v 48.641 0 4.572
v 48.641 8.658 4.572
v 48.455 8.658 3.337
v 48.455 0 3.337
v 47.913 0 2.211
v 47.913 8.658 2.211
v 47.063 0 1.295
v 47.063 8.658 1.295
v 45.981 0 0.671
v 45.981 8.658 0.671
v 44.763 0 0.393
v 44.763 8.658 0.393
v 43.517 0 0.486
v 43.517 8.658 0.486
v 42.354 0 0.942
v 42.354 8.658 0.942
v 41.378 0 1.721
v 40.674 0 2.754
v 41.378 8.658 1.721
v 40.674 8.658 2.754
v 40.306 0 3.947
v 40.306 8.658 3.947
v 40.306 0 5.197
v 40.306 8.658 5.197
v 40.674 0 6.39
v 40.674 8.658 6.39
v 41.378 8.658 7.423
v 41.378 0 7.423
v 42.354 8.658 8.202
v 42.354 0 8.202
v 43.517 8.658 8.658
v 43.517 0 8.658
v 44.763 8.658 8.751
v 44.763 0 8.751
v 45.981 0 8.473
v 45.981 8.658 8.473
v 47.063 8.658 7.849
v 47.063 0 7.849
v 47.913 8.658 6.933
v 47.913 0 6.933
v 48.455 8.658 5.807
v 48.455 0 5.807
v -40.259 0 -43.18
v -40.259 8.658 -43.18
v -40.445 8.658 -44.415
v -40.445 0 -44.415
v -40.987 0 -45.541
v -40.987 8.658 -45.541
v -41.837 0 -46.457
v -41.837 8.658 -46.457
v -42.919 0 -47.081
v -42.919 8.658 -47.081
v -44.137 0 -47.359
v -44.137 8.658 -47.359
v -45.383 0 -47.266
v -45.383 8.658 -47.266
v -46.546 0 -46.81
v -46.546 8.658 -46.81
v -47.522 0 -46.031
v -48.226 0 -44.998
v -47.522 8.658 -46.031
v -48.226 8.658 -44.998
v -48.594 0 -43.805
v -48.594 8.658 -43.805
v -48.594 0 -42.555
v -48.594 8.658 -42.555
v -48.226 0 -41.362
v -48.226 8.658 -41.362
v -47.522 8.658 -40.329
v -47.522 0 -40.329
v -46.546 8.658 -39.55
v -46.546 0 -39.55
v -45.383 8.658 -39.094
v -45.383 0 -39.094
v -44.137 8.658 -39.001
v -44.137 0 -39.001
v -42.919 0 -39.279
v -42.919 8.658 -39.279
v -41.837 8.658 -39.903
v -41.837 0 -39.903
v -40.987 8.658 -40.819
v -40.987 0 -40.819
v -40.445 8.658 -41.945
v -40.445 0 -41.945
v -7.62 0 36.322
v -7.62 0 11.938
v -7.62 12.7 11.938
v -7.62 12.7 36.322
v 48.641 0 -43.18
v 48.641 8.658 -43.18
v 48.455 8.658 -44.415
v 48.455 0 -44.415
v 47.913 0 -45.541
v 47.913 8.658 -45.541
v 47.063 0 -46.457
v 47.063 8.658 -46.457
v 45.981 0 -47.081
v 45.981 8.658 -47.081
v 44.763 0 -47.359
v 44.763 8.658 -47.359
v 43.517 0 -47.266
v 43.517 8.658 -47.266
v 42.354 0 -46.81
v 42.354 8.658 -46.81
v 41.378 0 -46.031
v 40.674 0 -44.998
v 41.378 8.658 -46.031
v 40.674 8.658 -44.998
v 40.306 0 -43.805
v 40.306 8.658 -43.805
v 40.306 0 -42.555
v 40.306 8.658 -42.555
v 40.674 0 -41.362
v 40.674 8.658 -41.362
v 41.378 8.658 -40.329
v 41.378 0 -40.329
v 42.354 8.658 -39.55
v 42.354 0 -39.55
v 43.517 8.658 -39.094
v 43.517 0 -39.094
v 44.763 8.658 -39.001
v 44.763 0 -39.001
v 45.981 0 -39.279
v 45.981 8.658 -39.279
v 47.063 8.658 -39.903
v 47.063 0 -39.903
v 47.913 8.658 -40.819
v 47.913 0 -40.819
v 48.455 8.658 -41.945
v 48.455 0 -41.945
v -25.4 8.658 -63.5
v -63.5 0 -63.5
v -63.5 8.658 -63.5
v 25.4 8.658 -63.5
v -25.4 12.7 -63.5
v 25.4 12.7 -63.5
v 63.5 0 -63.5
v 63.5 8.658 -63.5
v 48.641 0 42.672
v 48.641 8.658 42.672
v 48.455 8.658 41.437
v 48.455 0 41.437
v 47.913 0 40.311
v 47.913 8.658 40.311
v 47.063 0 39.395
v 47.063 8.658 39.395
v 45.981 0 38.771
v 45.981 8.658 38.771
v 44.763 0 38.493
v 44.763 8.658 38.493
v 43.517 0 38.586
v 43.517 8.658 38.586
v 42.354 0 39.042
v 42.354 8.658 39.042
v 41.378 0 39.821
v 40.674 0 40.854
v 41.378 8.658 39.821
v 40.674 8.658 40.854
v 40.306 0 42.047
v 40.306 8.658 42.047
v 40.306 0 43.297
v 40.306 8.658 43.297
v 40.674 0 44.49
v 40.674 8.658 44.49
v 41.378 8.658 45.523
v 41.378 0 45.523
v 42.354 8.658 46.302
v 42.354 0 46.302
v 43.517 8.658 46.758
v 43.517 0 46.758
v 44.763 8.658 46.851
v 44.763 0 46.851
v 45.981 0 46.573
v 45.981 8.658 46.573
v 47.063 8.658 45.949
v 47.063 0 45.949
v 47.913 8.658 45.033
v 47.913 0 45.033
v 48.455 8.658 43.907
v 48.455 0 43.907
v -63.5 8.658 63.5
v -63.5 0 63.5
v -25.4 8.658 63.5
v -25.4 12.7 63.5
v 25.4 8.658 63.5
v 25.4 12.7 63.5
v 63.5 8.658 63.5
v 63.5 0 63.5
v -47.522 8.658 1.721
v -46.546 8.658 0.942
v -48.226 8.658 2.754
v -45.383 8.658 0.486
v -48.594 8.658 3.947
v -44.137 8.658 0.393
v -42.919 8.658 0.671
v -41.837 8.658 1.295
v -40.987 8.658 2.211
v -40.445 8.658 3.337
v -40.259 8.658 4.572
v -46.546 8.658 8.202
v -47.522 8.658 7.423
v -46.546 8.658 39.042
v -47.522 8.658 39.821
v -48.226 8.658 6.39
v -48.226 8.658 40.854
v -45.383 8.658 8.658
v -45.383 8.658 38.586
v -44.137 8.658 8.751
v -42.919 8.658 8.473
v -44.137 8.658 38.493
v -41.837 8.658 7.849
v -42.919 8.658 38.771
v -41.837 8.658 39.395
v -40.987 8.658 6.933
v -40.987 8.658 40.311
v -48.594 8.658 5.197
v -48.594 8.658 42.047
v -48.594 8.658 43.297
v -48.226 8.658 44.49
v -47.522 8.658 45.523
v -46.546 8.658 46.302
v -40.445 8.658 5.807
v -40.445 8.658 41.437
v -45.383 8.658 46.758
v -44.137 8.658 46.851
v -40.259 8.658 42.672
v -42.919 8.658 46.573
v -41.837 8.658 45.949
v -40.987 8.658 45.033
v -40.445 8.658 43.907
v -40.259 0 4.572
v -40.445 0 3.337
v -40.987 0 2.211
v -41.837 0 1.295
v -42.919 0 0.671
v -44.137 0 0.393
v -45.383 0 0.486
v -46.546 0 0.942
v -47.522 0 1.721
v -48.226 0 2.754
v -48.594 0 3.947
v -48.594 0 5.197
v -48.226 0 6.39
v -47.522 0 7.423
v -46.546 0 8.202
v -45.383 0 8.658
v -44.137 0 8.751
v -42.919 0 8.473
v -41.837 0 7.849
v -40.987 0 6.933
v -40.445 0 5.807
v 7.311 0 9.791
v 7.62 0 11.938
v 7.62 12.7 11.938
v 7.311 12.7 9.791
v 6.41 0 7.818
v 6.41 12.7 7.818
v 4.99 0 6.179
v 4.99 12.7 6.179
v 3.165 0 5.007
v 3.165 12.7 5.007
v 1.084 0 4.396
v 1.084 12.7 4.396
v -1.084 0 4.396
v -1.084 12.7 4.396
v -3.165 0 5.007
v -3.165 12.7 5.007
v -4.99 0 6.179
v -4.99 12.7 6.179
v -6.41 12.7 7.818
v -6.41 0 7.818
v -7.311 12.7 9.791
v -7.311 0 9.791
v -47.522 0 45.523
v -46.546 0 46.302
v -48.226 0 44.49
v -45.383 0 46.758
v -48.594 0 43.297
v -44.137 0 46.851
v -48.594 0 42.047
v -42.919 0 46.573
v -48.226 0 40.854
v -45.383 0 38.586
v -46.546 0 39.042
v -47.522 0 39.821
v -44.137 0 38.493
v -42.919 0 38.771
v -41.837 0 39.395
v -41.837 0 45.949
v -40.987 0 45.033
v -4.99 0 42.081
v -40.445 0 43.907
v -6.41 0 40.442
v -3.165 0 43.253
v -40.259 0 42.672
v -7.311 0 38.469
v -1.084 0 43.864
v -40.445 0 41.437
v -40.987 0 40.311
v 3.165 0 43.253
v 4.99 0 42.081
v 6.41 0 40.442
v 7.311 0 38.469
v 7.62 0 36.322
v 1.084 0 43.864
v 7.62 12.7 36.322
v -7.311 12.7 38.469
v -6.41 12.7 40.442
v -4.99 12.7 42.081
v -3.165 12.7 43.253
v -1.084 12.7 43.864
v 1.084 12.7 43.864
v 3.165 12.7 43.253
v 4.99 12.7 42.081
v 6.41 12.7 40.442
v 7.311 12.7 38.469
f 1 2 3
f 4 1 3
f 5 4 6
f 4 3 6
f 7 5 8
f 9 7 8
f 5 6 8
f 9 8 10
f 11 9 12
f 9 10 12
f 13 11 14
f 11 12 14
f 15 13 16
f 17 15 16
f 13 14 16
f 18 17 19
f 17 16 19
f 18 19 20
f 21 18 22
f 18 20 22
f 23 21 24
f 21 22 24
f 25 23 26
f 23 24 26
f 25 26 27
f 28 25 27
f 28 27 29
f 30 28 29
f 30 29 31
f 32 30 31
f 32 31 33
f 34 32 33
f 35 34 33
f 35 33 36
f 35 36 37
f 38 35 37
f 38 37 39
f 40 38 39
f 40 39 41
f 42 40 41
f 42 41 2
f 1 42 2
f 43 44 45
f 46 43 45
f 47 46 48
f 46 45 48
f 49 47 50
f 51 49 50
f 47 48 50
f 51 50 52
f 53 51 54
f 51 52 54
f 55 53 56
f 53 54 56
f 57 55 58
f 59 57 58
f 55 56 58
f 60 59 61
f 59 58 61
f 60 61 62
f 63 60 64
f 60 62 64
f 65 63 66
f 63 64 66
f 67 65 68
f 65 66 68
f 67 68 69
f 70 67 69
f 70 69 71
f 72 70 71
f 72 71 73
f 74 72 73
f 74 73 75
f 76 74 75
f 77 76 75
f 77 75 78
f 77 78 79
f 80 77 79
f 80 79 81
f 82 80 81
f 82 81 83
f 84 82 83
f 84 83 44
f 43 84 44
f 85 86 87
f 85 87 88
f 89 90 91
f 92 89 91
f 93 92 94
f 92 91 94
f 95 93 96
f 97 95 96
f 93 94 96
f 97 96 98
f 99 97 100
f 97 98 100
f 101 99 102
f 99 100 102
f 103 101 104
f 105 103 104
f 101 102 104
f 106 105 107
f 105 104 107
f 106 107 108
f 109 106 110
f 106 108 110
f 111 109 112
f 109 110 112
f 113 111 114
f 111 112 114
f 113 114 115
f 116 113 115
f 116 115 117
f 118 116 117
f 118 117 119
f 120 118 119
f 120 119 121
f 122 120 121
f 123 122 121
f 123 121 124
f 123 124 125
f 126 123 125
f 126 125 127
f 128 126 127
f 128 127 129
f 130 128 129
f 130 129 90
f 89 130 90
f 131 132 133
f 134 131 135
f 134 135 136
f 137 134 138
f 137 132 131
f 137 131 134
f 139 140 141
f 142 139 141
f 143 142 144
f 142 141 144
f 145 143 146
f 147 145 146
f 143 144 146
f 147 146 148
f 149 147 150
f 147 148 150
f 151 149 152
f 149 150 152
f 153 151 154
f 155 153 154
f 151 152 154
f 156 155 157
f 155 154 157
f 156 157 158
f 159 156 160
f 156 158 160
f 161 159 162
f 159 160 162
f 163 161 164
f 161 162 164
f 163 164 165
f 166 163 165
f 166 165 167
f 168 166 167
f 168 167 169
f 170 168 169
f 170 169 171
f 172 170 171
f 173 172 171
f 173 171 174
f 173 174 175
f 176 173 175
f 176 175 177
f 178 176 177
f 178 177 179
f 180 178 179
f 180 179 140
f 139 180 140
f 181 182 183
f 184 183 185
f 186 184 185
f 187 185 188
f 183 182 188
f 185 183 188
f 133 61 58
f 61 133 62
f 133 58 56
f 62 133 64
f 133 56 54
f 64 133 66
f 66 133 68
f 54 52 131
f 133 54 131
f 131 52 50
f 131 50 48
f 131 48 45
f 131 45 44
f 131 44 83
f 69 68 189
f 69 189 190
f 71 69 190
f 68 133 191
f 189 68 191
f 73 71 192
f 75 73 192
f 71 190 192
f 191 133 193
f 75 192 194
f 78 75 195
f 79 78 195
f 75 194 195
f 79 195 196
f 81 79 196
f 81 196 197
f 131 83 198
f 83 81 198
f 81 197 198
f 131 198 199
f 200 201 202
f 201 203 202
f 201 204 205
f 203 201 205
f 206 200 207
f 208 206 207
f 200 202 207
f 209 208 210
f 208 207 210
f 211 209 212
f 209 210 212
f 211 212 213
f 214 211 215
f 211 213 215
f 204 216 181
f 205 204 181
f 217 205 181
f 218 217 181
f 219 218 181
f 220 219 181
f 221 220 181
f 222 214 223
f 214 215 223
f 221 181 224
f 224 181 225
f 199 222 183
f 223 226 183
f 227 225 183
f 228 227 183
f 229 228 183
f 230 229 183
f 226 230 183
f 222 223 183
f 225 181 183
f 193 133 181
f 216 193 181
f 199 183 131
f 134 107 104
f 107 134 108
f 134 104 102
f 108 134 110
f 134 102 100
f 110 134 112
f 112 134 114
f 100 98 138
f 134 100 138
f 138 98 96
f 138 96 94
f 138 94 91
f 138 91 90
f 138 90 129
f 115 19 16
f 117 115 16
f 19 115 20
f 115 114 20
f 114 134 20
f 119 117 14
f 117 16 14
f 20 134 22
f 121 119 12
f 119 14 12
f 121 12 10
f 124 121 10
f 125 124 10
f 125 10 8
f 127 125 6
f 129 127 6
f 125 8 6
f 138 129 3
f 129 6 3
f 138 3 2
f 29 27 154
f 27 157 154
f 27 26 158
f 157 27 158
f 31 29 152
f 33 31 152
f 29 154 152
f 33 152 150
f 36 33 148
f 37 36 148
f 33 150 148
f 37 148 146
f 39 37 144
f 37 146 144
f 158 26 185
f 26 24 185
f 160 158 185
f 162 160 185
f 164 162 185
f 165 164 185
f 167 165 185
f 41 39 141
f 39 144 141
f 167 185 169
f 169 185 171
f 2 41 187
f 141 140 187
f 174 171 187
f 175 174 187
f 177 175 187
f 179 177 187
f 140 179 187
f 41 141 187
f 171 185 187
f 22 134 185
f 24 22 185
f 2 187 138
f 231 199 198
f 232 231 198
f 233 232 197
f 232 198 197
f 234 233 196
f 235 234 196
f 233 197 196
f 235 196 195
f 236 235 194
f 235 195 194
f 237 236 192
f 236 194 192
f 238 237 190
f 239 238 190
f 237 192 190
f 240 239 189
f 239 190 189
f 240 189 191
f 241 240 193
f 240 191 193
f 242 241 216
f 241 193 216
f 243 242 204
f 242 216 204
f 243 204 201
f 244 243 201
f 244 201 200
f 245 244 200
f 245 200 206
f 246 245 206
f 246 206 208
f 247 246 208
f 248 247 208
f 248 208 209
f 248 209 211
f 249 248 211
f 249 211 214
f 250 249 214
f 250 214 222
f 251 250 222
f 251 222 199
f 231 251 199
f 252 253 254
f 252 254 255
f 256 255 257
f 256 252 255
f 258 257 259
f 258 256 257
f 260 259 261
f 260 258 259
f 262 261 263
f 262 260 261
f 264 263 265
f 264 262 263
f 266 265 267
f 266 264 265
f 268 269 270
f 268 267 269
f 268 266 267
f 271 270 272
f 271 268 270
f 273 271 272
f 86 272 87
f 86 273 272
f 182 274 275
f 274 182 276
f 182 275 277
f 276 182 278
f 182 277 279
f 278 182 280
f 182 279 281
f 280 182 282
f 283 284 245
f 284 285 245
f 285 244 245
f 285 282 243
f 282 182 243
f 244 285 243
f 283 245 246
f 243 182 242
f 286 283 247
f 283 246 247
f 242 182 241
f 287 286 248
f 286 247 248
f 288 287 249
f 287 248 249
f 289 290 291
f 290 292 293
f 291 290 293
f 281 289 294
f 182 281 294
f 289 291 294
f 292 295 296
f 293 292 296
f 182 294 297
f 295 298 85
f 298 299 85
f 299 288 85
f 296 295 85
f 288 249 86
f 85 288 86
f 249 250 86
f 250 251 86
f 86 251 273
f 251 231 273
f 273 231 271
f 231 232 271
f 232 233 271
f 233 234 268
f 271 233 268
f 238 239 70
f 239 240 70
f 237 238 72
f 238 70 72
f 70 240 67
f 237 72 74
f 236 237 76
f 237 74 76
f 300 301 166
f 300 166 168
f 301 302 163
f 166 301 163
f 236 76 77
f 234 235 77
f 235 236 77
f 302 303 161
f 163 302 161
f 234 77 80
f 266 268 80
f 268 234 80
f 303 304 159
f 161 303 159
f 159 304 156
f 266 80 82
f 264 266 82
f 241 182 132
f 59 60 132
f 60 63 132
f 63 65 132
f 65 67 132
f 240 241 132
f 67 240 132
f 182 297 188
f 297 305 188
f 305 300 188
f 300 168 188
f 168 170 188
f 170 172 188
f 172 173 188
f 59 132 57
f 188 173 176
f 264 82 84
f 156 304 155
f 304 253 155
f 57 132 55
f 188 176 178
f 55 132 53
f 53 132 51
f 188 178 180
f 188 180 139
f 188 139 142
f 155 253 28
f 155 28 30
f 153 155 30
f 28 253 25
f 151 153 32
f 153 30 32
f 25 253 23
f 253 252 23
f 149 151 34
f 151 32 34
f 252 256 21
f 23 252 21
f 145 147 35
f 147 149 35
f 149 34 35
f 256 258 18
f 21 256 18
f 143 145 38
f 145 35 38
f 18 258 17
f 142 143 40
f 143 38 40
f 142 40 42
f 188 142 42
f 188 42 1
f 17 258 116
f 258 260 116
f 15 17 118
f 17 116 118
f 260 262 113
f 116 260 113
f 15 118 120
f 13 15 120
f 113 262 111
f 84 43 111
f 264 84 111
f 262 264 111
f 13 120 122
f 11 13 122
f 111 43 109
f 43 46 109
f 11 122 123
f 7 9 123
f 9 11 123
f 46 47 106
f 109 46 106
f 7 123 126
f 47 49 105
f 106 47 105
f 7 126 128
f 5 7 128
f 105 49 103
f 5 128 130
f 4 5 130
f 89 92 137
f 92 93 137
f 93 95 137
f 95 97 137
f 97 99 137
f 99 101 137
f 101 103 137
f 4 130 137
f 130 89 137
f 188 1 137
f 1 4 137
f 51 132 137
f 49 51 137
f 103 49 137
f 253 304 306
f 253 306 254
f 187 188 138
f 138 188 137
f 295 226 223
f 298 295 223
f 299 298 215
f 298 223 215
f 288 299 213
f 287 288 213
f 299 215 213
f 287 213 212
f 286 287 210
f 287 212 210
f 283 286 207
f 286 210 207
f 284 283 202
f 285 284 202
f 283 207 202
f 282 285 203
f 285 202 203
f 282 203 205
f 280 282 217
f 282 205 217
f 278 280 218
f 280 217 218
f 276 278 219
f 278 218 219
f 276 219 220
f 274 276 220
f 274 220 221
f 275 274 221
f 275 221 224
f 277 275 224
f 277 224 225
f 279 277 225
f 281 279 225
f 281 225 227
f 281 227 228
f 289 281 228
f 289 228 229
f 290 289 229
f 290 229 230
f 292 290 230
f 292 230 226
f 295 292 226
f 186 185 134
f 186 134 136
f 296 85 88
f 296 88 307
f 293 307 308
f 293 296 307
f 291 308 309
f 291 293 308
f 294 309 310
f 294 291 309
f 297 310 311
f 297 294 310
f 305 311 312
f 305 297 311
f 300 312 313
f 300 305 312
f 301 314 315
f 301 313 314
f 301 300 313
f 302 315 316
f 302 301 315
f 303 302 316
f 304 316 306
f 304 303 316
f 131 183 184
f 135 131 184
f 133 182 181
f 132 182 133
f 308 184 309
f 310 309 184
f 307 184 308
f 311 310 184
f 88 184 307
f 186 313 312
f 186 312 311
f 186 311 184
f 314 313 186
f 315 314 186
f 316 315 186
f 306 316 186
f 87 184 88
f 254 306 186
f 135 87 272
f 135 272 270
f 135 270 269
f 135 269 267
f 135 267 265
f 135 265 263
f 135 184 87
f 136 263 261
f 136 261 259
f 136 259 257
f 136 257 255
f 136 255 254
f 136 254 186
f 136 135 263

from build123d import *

# Parameters (mm, degrees)
SKETCH2_W              = 127
SKETCH2_H              = 127
BOSS_EXTRUDE1_DEPTH    = 12.7
SKETCH3_W              = 38.1
SKETCH3_H              = 4.04158002
CUT_EXTRUDE2_DEPTH     = 128
F_10_0MM_DOWEL_HOLE1_D = 8.382
CUT_EXTRUDE4_DEPTH     = 13.7


with BuildPart() as part:
    # Sketch2 → Boss-Extrude1 (new body)
    with BuildSketch(Plane(origin=(0, 0, 0), x_dir=(1, 0, 0), z_dir=(0, 1, 0))):
        Rectangle(SKETCH2_W, SKETCH2_H)
    extrude(amount=BOSS_EXTRUDE1_DEPTH)

    # Sketch3 → Cut-Extrude2 (cut, through all)
    with BuildSketch(Plane.XY.offset(63.5)):
        with Locations((-44.45, 10.67920999)):
            Rectangle(SKETCH3_W, SKETCH3_H)
        with Locations((44.45, 10.67920999)):
            Rectangle(SKETCH3_W, SKETCH3_H)
    extrude(amount=-CUT_EXTRUDE2_DEPTH, mode=Mode.SUBTRACT)

    # Ø10.0mm Dowel Hole1 (through all)
    with Locations(Plane(origin=(0, 0, 0), x_dir=(-1, 0, 0), z_dir=(0, -1, 0))):
        with Locations((-44.45, 43.18), (-44.45, -4.572), (-44.45, -42.672), (44.45, 43.18), (44.45, -4.572), (44.45, -42.672)):
            Hole(F_10_0MM_DOWEL_HOLE1_D / 2)

    # Sketch10 → Cut-Extrude4 (cut, through all)
    with BuildSketch(Plane(origin=(0, 0, 0), x_dir=(-1, 0, 0), z_dir=(0, -1, 0))):
        with BuildLine():
            Line((7.62, -11.938), (7.62, -36.322))
            ThreePointArc((7.62, -36.322), (0, -43.942), (-7.62, -36.322))
            Line((-7.62, -36.322), (-7.62, -11.938))
            ThreePointArc((-7.62, -11.938), (0, -4.318), (7.62, -11.938))
        make_face()
    extrude(amount=-CUT_EXTRUDE4_DEPTH, mode=Mode.SUBTRACT)


solid = part.part
